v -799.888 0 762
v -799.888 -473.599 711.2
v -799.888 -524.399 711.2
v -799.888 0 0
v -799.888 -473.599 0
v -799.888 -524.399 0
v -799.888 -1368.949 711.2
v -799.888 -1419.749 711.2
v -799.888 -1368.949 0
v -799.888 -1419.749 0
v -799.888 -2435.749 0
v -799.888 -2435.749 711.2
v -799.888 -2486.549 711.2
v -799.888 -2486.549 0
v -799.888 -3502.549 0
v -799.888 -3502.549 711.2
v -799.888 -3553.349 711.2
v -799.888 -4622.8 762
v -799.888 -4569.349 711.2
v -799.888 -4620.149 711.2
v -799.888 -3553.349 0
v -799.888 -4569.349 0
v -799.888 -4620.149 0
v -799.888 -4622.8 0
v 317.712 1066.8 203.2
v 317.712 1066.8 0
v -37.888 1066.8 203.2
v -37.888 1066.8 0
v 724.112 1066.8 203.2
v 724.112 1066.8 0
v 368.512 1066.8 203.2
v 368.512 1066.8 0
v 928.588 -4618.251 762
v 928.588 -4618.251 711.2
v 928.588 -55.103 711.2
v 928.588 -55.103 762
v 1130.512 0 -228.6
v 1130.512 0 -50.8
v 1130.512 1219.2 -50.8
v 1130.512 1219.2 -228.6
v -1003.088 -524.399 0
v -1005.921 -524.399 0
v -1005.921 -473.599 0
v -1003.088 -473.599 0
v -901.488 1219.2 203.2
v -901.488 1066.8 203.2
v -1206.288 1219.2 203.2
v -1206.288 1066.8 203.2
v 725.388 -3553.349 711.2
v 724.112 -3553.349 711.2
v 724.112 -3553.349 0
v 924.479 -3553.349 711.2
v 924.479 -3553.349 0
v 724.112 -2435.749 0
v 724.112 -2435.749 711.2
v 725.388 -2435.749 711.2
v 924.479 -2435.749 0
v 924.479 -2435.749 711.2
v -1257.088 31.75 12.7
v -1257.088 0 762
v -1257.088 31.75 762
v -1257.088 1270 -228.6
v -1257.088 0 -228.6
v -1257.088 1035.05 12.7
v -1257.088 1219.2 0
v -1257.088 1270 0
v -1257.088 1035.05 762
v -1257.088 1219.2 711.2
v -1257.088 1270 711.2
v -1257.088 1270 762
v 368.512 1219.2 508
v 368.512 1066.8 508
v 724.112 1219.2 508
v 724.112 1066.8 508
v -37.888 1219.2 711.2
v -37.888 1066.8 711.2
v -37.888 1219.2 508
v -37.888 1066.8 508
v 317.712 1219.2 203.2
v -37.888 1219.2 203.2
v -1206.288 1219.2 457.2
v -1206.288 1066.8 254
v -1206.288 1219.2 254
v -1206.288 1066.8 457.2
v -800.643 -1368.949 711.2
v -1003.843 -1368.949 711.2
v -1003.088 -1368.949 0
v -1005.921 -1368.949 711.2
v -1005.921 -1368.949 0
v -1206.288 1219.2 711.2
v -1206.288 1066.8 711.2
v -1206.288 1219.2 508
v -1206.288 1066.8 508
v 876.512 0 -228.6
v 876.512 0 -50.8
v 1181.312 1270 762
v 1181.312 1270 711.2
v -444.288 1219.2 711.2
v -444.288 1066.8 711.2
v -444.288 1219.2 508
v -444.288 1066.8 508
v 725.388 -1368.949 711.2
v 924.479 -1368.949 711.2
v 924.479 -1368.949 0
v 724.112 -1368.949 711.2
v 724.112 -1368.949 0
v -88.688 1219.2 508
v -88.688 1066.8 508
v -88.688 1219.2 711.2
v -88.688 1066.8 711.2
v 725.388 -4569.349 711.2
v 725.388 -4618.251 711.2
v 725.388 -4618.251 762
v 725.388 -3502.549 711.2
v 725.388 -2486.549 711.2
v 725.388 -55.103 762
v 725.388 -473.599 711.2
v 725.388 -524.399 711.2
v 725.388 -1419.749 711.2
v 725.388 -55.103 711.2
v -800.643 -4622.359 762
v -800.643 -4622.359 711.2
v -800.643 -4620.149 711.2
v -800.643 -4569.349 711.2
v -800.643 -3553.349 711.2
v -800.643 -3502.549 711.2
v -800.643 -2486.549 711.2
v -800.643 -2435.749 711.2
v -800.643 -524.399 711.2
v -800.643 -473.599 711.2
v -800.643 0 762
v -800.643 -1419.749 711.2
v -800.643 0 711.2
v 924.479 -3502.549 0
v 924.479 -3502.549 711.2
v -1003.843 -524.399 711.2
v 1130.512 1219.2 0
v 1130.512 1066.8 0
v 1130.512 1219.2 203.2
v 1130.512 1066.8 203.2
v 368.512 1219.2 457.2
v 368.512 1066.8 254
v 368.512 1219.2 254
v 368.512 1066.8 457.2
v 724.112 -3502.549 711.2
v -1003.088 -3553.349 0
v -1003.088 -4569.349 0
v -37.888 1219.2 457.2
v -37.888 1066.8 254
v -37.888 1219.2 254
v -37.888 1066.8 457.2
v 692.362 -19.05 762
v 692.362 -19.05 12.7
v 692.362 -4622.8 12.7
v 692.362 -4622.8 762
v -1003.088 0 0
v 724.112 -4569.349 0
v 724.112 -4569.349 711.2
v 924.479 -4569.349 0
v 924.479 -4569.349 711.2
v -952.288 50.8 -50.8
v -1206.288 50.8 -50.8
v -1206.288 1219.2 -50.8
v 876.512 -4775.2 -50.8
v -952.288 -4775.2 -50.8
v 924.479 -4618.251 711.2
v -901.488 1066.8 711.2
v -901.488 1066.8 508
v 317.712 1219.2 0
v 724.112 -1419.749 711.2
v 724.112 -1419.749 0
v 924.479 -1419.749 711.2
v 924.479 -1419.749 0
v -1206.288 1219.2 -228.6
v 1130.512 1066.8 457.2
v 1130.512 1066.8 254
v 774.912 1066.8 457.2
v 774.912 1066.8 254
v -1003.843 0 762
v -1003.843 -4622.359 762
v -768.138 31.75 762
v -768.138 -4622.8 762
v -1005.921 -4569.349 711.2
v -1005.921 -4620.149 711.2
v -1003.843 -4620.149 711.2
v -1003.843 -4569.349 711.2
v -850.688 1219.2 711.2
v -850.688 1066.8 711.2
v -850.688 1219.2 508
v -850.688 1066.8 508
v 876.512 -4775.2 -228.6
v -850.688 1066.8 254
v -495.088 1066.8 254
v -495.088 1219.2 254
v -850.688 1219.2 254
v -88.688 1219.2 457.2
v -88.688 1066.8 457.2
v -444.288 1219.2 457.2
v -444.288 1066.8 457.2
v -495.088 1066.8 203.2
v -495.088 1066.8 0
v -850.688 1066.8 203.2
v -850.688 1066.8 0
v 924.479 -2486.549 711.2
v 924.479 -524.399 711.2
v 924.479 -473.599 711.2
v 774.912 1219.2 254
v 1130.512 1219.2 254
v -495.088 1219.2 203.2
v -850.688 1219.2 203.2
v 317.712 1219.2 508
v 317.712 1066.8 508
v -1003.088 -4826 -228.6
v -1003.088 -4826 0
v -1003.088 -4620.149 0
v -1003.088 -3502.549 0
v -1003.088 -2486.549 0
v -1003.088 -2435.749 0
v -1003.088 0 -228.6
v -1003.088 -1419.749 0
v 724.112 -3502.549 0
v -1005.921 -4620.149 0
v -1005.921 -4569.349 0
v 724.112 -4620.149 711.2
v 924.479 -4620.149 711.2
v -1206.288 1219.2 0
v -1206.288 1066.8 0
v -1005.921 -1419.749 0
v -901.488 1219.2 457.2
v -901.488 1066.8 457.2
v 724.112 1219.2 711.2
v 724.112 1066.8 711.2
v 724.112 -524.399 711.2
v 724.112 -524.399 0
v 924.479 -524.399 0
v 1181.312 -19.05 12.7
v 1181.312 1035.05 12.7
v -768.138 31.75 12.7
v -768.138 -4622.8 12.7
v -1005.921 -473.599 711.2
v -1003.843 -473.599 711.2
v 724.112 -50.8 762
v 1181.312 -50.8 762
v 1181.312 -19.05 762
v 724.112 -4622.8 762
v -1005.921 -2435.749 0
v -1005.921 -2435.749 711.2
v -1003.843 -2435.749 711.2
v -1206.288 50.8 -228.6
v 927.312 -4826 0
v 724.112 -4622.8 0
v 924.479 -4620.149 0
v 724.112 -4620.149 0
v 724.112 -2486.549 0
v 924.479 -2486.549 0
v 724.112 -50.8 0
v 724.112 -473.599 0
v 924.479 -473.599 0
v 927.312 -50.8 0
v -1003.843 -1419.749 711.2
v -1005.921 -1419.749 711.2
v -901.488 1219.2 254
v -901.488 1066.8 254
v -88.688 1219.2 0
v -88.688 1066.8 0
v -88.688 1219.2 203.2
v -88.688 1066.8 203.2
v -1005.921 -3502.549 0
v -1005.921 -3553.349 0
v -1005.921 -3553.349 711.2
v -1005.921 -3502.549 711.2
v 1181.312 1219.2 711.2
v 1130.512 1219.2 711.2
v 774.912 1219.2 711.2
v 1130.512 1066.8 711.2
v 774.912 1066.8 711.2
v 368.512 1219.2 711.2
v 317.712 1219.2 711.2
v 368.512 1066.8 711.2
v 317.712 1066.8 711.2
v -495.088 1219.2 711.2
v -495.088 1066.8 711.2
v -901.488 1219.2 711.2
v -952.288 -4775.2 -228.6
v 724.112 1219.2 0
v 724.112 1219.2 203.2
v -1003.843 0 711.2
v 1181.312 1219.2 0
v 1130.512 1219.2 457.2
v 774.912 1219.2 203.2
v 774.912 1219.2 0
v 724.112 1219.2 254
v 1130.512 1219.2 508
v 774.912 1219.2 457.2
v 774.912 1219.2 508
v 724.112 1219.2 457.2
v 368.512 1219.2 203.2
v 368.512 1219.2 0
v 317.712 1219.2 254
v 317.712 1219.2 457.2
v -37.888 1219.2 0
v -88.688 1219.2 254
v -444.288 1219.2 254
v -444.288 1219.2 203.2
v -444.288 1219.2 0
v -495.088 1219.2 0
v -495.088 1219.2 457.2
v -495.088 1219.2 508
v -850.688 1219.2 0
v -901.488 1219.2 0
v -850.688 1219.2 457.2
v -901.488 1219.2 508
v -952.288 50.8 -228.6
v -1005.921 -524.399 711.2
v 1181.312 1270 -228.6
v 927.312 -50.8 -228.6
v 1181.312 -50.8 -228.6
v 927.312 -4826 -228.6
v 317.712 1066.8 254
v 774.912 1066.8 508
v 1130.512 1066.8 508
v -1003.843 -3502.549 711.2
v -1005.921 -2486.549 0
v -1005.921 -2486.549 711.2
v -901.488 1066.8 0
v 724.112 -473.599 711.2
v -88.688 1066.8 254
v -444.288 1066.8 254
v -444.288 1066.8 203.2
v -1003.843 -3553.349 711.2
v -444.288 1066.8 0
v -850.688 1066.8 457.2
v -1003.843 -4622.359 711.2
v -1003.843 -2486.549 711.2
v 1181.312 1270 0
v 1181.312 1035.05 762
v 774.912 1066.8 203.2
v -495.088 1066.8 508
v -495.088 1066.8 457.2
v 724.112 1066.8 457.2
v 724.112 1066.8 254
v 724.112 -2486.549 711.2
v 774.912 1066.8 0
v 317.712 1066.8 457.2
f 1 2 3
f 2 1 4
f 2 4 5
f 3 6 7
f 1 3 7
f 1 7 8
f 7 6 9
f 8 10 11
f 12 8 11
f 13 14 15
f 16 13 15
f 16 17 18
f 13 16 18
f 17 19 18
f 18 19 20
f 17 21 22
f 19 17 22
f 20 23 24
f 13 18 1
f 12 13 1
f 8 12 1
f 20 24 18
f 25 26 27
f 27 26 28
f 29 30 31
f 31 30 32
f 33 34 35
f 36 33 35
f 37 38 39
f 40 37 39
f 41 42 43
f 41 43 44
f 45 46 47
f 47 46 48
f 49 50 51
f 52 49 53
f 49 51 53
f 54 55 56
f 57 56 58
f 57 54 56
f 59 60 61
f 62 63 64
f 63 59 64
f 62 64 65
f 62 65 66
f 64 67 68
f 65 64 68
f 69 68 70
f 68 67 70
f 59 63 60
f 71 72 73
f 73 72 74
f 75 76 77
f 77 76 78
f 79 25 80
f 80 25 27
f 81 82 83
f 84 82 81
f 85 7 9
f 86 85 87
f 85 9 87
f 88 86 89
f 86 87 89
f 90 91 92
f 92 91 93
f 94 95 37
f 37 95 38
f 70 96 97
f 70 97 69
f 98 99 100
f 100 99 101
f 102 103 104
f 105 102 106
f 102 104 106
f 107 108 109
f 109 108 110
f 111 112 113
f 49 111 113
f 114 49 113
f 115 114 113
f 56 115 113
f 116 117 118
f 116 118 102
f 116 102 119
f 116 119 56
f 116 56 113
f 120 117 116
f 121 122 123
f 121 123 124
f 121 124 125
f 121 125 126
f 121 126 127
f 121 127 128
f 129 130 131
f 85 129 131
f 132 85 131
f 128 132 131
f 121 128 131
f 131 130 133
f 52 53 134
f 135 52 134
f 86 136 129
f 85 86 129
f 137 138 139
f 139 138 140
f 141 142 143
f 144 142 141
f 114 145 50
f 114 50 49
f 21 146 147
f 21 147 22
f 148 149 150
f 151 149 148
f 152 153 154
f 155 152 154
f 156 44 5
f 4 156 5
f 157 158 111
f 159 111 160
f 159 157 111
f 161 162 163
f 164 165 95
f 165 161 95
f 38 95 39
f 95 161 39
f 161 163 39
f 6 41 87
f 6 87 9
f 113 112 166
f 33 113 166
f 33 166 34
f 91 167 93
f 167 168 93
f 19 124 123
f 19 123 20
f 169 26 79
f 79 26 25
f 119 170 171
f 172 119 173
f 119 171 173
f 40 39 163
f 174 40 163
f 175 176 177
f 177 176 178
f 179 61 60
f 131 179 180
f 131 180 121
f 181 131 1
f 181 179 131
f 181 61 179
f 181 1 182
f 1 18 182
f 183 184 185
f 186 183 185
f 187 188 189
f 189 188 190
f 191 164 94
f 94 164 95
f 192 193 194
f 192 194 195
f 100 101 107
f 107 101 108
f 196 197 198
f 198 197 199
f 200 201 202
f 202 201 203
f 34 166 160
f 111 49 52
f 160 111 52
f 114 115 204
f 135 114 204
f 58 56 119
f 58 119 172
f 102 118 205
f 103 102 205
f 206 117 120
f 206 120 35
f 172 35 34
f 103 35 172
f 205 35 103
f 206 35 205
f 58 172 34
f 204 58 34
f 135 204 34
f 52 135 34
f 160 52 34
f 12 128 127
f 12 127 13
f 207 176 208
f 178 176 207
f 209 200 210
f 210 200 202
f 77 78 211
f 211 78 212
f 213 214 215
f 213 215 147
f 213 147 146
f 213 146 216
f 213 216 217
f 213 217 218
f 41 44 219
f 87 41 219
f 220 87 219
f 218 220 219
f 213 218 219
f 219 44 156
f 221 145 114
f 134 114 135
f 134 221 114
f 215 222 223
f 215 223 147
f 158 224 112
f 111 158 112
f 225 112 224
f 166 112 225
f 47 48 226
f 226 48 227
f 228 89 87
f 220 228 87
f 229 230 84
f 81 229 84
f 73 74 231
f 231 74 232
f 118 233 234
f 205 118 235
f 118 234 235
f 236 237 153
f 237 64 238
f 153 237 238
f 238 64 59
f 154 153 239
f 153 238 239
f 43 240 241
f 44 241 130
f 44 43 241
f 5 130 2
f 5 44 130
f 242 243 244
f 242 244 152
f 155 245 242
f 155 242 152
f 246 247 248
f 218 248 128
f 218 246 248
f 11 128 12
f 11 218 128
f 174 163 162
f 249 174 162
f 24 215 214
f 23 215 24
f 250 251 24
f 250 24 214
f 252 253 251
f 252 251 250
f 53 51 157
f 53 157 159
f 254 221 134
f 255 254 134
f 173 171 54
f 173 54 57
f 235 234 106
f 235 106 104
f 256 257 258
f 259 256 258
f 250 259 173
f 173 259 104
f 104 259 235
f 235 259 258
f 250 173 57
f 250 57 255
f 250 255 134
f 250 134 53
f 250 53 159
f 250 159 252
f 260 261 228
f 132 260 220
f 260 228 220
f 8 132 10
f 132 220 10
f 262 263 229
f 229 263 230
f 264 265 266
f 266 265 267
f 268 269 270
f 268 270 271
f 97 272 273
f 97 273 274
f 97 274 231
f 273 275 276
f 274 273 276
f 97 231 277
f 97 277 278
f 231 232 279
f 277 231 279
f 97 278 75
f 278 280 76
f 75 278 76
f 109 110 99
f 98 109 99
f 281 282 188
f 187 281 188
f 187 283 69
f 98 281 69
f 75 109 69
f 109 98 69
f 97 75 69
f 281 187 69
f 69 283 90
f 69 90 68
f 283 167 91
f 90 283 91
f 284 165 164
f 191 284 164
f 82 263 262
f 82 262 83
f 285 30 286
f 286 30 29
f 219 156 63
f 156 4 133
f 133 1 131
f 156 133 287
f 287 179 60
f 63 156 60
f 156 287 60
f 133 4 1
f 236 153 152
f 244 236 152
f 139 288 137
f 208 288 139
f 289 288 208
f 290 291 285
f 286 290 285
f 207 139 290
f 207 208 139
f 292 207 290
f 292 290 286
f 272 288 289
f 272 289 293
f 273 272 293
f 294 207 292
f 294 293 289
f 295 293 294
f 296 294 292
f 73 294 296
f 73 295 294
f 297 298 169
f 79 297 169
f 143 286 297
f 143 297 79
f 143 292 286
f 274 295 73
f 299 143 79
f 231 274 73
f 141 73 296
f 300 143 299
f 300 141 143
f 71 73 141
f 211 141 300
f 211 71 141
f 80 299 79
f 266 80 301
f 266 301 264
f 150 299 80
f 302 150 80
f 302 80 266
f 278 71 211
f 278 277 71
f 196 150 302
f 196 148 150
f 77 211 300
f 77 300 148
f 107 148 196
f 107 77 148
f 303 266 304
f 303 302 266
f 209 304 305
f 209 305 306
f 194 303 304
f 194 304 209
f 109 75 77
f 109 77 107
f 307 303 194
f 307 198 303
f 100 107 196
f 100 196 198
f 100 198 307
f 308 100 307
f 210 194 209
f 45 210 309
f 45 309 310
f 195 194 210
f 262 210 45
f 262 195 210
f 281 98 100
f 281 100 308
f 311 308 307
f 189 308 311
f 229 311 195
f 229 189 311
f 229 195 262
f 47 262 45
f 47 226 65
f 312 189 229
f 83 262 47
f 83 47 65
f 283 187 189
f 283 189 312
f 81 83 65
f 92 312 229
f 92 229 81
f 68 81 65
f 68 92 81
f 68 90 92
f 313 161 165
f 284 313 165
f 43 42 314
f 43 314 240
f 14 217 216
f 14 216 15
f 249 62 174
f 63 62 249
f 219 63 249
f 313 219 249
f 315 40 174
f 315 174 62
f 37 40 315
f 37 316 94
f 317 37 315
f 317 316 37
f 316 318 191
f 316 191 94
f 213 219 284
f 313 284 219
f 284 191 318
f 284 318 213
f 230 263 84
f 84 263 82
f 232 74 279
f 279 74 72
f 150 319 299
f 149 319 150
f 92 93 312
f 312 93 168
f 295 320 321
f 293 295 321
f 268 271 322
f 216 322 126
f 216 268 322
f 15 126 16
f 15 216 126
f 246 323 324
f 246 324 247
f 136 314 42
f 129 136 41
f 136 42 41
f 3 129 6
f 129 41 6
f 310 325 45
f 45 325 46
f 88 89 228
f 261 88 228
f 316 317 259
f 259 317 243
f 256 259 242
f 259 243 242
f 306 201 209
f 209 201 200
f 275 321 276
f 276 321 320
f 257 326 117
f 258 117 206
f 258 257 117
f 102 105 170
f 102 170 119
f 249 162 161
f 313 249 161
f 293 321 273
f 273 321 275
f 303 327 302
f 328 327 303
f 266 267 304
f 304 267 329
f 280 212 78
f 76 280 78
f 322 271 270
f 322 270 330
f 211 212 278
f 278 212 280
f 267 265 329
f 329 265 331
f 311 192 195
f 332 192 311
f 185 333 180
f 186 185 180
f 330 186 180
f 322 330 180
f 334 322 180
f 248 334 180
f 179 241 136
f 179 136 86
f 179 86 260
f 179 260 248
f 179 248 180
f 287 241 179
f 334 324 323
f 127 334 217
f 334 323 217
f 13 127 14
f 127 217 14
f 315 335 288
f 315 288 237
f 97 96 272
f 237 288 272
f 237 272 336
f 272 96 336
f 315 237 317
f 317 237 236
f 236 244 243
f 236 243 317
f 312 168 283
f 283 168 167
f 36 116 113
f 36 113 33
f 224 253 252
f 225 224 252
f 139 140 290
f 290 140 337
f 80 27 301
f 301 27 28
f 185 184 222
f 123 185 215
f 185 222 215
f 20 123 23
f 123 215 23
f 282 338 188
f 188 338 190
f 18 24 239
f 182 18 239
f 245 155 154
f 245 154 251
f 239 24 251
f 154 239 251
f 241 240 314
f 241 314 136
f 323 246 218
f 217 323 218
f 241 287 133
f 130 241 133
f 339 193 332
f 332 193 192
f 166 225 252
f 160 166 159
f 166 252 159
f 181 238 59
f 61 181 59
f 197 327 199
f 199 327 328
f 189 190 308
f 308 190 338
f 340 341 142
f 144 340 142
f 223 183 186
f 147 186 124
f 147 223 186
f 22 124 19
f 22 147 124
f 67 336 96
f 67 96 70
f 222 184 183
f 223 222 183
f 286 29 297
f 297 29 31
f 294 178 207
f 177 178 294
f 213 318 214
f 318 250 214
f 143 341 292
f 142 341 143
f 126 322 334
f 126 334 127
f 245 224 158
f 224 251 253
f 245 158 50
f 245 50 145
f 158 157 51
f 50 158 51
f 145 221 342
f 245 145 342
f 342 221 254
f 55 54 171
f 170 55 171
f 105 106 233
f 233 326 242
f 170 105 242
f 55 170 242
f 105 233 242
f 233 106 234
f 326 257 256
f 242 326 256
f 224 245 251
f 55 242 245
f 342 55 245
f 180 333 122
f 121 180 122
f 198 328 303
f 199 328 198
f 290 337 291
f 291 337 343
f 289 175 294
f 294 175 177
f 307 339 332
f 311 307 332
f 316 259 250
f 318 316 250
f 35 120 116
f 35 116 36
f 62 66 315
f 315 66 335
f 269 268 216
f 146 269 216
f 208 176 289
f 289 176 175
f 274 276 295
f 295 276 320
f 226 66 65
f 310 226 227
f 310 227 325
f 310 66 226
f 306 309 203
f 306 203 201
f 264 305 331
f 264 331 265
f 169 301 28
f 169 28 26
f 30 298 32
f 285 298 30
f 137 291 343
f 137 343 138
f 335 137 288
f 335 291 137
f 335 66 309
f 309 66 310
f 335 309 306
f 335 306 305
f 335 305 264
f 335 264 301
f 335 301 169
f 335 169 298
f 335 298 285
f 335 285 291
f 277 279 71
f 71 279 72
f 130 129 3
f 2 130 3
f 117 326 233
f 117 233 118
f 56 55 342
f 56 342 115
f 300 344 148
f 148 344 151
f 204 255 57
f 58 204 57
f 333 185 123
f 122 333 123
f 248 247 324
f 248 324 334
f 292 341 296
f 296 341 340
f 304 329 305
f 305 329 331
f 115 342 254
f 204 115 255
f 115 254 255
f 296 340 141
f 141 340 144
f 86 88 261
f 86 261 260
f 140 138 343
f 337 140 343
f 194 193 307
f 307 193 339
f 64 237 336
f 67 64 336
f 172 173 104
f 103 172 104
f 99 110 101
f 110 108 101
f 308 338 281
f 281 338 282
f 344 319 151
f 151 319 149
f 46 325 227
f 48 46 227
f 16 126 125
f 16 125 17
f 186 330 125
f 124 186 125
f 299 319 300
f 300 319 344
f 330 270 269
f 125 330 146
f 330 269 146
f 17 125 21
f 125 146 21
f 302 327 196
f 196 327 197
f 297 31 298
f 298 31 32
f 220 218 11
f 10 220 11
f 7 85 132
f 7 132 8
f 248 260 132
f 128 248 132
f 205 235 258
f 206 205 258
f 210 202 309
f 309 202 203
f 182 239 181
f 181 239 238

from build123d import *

# Parameters (mm, degrees)
F1_DEPTH  = 12.7
F3_DEPTH  = 749.3
F5_DEPTH  = 50.8
F6_W      = 355.6
F6_H      = 203.2
F6_W_2    = 304.8
F7_DEPTH  = 152.4
F8_W      = 2438.4
F8_H      = 50.8
F9_DEPTH  = 203.2
F10_W     = 1054.1
F10_H     = 749.3
F11_DEPTH = 31.751
F12_W     = 1003.3
F12_H     = 749.3
F13_DEPTH = 31.751
F14_W     = 1460.5
F14_H     = 749.3
F15_DEPTH = 234.951
F16_W     = 1930.4
F16_H     = 50.8
F17_DEPTH = 711.2
F18_W     = 1460.5
F18_H     = 698.5
F19_DEPTH = 4352.402444
F20_W     = 203.2
F20_H     = 4622.8
F20_H_2   = 4563.148059
F21_DEPTH = 50.8
F23_DEPTH = 177.8


with BuildPart() as f1:
    # F0 (on Top) → F1 (new body)
    with BuildSketch(Plane.XY):
        Polygon((-1257.087652, 1066.8), (-1257.087652, 0), (-799.887652, 0), (-799.887652, -4622.8), (724.112348, -4622.8), (724.112348, -50.8), (1181.312348, -50.8), (1181.312348, 1066.8), align=None)
    extrude(amount=F1_DEPTH)

    # F2 (on face) → F3 (join)
    with BuildSketch(Plane.XY.offset(12.7)):
        Polygon((1181.312348, 1066.8), (-1257.087652, 1066.8), (-1257.087652, 0), (-799.887652, 0), (-799.887652, -4622.8), (724.112348, -4622.8), (724.112348, -50.8), (1181.312348, -50.8), align=None)
        Polygon((-768.137652, -4591.05), (-768.137652, 31.75), (-1225.337652, 31.75), (-1225.337652, 1035.05), (1149.562348, 1035.05), (1149.562348, -19.05), (692.362348, -19.05), (692.362348, -4591.05), align=None, mode=Mode.SUBTRACT)
    extrude(amount=F3_DEPTH)

    # F4 (on face) → F5 (join)
    with BuildSketch(Plane.XY):
        Polygon((-1003.087652, -4826), (927.312348, -4826), (927.312348, -50.8), (1181.312348, -50.8), (1181.312348, 1270), (927.312348, 1270), (-1003.087652, 1270), (-1257.087652, 1270), (-1257.087652, 0), (-1003.087652, 0), align=None)
    extrude(amount=-F5_DEPTH)

    # F6 (on face) → F7 (join)
    with BuildSketch(Plane(origin=(0, 1066.8, 0), x_dir=(-1, 0, 0), z_dir=(0, 1, 0))):
        Polygon((-1181.312348, 203.2), (-1181.312348, 0), (-1130.512348, 0), (-1130.512348, 203.2), (-774.912348, 203.2), (-774.912348, 0), (-724.112348, 0), (-724.112348, 203.2), (-368.512348, 203.2), (-368.512348, 0), (-317.712348, 0), (-317.712348, 203.2), (37.887652, 203.2), (37.887652, 0), (88.687652, 0), (88.687652, 203.2), (444.287652, 203.2), (444.287652, 0), (495.087652, 0), (495.087652, 203.2), (850.687652, 203.2), (850.687652, 0), (901.487652, 0), (901.487652, 203.2), (1206.287652, 203.2), (1206.287652, 0), (1257.087652, 0), (1257.087652, 203.2), (1257.087652, 254), (1257.087652, 457.2), (1257.087652, 508), (1257.087652, 711.2), (1206.287652, 711.2), (1206.287652, 508), (901.487652, 508), (901.487652, 711.2), (850.687652, 711.2), (850.687652, 508), (495.087652, 508), (495.087652, 711.2), (444.287652, 711.2), (444.287652, 508), (88.687652, 508), (88.687652, 711.2), (37.887652, 711.2), (37.887652, 508), (-317.712348, 508), (-317.712348, 711.2), (-368.512348, 711.2), (-368.512348, 508), (-724.112348, 508), (-724.112348, 711.2), (-774.912348, 711.2), (-774.912348, 508), (-1130.512348, 508), (-1130.512348, 711.2), (-1181.312348, 711.2), (-1181.312348, 508), (-1181.312348, 457.2), (-1181.312348, 254), align=None)
        with Locations((-952.712348, 355.6)):
            Rectangle(F6_W, F6_H, mode=Mode.SUBTRACT)
        with Locations((-546.312348, 355.6)):
            Rectangle(F6_W, F6_H, mode=Mode.SUBTRACT)
        with Locations((-139.912348, 355.6)):
            Rectangle(F6_W, F6_H, mode=Mode.SUBTRACT)
        with Locations((266.487652, 355.6)):
            Rectangle(F6_W, F6_H, mode=Mode.SUBTRACT)
        with Locations((672.887652, 355.6)):
            Rectangle(F6_W, F6_H, mode=Mode.SUBTRACT)
        with Locations((1053.887652, 355.6)):
            Rectangle(F6_W_2, F6_H, mode=Mode.SUBTRACT)
    extrude(amount=F7_DEPTH)

    # F8 (on face) → F9 (join)
    with BuildSketch(Plane(origin=(0, 1066.8, 0), x_dir=(-1, 0, 0), z_dir=(0, 1, 0))):
        with Locations((37.887652, 736.6)):
            Rectangle(F8_W, F8_H)
    extrude(amount=F9_DEPTH)

    # F10 (on face) → F11 (cut, through all)
    with BuildSketch(Plane(origin=(1149.562348, 0, 0), x_dir=(0, -1, 0), z_dir=(-1, 0, 0))):
        with Locations((-508, 387.35)):
            Rectangle(F10_W, F10_H)
    extrude(amount=-F11_DEPTH, mode=Mode.SUBTRACT)

    # F12 (on face) → F13 (cut, through all)
    with BuildSketch(Plane.YZ.offset(-1225.337652)):
        with Locations((533.4, 387.35)):
            Rectangle(F12_W, F12_H)
    extrude(amount=-F13_DEPTH, mode=Mode.SUBTRACT)

    # F14 (on face) → F15 (cut, through all)
    with BuildSketch(Plane(origin=(0, -4591.05, 0), x_dir=(-1, 0, 0), z_dir=(0, 1, 0))):
        with Locations((37.887652, 387.35)):
            Rectangle(F14_W, F14_H)
    extrude(amount=-F15_DEPTH, mode=Mode.SUBTRACT)

    # F16 (on face) → F17 (join)
    with BuildSketch(Plane.XY):
        with Locations((-40.720533, -4594.748556)):
            Rectangle(F16_W, F16_H)
        with Locations((-40.720533, -3527.948556)):
            Rectangle(F16_W, F16_H)
        Polygon((-1005.920533, -1419.748556), (-103.030887, -1419.748556), (924.479467, -1419.748556), (924.479467, -1368.948556), (-1005.920533, -1368.948556), align=None)
        with Locations((-40.720533, -498.998556)):
            Rectangle(F16_W, F16_H)
        with Locations((-40.720533, -2461.148556)):
            Rectangle(F16_W, F16_H)
    extrude(amount=F17_DEPTH)

    # F18 (on face) → F19 (cut, through all)
    with BuildSketch(Plane(origin=(0, -473.598556, 0), x_dir=(-1, 0, 0), z_dir=(0, 1, 0))):
        with Locations((37.887652, 361.95)):
            Rectangle(F18_W, F18_H)
    extrude(amount=-F19_DEPTH, mode=Mode.SUBTRACT)

    # F20 (on face) → F21 (join, through all)
    with BuildSketch(Plane.XY.offset(711.2)):
        with Locations((-902.243337, -2310.959497)):
            Rectangle(F20_W, F20_H)
        with Locations((826.987812, -2336.676817)):
            Rectangle(F20_W, F20_H_2)
    extrude(amount=F21_DEPTH)

    # F22 (on face) → F23 (join)
    with BuildSketch(Plane(origin=(0, 0, -50.8), x_dir=(1, 0, 0), z_dir=(0, 0, -1))):
        Polygon((927.312348, 50.8), (927.312348, 4826), (-1003.087652, 4826), (-1003.087652, 0), (-1257.087652, 0), (-1257.087652, -1270), (1181.312348, -1270), (1181.312348, 50.8), align=None)
        Polygon((876.512348, 0), (1130.512348, 0), (1130.512348, -1219.2), (-1206.287652, -1219.2), (-1206.287652, -50.8), (-952.287652, -50.8), (-952.287652, 4775.2), (876.512348, 4775.2), align=None, mode=Mode.SUBTRACT)
    extrude(amount=F23_DEPTH)


solid = f1.part
